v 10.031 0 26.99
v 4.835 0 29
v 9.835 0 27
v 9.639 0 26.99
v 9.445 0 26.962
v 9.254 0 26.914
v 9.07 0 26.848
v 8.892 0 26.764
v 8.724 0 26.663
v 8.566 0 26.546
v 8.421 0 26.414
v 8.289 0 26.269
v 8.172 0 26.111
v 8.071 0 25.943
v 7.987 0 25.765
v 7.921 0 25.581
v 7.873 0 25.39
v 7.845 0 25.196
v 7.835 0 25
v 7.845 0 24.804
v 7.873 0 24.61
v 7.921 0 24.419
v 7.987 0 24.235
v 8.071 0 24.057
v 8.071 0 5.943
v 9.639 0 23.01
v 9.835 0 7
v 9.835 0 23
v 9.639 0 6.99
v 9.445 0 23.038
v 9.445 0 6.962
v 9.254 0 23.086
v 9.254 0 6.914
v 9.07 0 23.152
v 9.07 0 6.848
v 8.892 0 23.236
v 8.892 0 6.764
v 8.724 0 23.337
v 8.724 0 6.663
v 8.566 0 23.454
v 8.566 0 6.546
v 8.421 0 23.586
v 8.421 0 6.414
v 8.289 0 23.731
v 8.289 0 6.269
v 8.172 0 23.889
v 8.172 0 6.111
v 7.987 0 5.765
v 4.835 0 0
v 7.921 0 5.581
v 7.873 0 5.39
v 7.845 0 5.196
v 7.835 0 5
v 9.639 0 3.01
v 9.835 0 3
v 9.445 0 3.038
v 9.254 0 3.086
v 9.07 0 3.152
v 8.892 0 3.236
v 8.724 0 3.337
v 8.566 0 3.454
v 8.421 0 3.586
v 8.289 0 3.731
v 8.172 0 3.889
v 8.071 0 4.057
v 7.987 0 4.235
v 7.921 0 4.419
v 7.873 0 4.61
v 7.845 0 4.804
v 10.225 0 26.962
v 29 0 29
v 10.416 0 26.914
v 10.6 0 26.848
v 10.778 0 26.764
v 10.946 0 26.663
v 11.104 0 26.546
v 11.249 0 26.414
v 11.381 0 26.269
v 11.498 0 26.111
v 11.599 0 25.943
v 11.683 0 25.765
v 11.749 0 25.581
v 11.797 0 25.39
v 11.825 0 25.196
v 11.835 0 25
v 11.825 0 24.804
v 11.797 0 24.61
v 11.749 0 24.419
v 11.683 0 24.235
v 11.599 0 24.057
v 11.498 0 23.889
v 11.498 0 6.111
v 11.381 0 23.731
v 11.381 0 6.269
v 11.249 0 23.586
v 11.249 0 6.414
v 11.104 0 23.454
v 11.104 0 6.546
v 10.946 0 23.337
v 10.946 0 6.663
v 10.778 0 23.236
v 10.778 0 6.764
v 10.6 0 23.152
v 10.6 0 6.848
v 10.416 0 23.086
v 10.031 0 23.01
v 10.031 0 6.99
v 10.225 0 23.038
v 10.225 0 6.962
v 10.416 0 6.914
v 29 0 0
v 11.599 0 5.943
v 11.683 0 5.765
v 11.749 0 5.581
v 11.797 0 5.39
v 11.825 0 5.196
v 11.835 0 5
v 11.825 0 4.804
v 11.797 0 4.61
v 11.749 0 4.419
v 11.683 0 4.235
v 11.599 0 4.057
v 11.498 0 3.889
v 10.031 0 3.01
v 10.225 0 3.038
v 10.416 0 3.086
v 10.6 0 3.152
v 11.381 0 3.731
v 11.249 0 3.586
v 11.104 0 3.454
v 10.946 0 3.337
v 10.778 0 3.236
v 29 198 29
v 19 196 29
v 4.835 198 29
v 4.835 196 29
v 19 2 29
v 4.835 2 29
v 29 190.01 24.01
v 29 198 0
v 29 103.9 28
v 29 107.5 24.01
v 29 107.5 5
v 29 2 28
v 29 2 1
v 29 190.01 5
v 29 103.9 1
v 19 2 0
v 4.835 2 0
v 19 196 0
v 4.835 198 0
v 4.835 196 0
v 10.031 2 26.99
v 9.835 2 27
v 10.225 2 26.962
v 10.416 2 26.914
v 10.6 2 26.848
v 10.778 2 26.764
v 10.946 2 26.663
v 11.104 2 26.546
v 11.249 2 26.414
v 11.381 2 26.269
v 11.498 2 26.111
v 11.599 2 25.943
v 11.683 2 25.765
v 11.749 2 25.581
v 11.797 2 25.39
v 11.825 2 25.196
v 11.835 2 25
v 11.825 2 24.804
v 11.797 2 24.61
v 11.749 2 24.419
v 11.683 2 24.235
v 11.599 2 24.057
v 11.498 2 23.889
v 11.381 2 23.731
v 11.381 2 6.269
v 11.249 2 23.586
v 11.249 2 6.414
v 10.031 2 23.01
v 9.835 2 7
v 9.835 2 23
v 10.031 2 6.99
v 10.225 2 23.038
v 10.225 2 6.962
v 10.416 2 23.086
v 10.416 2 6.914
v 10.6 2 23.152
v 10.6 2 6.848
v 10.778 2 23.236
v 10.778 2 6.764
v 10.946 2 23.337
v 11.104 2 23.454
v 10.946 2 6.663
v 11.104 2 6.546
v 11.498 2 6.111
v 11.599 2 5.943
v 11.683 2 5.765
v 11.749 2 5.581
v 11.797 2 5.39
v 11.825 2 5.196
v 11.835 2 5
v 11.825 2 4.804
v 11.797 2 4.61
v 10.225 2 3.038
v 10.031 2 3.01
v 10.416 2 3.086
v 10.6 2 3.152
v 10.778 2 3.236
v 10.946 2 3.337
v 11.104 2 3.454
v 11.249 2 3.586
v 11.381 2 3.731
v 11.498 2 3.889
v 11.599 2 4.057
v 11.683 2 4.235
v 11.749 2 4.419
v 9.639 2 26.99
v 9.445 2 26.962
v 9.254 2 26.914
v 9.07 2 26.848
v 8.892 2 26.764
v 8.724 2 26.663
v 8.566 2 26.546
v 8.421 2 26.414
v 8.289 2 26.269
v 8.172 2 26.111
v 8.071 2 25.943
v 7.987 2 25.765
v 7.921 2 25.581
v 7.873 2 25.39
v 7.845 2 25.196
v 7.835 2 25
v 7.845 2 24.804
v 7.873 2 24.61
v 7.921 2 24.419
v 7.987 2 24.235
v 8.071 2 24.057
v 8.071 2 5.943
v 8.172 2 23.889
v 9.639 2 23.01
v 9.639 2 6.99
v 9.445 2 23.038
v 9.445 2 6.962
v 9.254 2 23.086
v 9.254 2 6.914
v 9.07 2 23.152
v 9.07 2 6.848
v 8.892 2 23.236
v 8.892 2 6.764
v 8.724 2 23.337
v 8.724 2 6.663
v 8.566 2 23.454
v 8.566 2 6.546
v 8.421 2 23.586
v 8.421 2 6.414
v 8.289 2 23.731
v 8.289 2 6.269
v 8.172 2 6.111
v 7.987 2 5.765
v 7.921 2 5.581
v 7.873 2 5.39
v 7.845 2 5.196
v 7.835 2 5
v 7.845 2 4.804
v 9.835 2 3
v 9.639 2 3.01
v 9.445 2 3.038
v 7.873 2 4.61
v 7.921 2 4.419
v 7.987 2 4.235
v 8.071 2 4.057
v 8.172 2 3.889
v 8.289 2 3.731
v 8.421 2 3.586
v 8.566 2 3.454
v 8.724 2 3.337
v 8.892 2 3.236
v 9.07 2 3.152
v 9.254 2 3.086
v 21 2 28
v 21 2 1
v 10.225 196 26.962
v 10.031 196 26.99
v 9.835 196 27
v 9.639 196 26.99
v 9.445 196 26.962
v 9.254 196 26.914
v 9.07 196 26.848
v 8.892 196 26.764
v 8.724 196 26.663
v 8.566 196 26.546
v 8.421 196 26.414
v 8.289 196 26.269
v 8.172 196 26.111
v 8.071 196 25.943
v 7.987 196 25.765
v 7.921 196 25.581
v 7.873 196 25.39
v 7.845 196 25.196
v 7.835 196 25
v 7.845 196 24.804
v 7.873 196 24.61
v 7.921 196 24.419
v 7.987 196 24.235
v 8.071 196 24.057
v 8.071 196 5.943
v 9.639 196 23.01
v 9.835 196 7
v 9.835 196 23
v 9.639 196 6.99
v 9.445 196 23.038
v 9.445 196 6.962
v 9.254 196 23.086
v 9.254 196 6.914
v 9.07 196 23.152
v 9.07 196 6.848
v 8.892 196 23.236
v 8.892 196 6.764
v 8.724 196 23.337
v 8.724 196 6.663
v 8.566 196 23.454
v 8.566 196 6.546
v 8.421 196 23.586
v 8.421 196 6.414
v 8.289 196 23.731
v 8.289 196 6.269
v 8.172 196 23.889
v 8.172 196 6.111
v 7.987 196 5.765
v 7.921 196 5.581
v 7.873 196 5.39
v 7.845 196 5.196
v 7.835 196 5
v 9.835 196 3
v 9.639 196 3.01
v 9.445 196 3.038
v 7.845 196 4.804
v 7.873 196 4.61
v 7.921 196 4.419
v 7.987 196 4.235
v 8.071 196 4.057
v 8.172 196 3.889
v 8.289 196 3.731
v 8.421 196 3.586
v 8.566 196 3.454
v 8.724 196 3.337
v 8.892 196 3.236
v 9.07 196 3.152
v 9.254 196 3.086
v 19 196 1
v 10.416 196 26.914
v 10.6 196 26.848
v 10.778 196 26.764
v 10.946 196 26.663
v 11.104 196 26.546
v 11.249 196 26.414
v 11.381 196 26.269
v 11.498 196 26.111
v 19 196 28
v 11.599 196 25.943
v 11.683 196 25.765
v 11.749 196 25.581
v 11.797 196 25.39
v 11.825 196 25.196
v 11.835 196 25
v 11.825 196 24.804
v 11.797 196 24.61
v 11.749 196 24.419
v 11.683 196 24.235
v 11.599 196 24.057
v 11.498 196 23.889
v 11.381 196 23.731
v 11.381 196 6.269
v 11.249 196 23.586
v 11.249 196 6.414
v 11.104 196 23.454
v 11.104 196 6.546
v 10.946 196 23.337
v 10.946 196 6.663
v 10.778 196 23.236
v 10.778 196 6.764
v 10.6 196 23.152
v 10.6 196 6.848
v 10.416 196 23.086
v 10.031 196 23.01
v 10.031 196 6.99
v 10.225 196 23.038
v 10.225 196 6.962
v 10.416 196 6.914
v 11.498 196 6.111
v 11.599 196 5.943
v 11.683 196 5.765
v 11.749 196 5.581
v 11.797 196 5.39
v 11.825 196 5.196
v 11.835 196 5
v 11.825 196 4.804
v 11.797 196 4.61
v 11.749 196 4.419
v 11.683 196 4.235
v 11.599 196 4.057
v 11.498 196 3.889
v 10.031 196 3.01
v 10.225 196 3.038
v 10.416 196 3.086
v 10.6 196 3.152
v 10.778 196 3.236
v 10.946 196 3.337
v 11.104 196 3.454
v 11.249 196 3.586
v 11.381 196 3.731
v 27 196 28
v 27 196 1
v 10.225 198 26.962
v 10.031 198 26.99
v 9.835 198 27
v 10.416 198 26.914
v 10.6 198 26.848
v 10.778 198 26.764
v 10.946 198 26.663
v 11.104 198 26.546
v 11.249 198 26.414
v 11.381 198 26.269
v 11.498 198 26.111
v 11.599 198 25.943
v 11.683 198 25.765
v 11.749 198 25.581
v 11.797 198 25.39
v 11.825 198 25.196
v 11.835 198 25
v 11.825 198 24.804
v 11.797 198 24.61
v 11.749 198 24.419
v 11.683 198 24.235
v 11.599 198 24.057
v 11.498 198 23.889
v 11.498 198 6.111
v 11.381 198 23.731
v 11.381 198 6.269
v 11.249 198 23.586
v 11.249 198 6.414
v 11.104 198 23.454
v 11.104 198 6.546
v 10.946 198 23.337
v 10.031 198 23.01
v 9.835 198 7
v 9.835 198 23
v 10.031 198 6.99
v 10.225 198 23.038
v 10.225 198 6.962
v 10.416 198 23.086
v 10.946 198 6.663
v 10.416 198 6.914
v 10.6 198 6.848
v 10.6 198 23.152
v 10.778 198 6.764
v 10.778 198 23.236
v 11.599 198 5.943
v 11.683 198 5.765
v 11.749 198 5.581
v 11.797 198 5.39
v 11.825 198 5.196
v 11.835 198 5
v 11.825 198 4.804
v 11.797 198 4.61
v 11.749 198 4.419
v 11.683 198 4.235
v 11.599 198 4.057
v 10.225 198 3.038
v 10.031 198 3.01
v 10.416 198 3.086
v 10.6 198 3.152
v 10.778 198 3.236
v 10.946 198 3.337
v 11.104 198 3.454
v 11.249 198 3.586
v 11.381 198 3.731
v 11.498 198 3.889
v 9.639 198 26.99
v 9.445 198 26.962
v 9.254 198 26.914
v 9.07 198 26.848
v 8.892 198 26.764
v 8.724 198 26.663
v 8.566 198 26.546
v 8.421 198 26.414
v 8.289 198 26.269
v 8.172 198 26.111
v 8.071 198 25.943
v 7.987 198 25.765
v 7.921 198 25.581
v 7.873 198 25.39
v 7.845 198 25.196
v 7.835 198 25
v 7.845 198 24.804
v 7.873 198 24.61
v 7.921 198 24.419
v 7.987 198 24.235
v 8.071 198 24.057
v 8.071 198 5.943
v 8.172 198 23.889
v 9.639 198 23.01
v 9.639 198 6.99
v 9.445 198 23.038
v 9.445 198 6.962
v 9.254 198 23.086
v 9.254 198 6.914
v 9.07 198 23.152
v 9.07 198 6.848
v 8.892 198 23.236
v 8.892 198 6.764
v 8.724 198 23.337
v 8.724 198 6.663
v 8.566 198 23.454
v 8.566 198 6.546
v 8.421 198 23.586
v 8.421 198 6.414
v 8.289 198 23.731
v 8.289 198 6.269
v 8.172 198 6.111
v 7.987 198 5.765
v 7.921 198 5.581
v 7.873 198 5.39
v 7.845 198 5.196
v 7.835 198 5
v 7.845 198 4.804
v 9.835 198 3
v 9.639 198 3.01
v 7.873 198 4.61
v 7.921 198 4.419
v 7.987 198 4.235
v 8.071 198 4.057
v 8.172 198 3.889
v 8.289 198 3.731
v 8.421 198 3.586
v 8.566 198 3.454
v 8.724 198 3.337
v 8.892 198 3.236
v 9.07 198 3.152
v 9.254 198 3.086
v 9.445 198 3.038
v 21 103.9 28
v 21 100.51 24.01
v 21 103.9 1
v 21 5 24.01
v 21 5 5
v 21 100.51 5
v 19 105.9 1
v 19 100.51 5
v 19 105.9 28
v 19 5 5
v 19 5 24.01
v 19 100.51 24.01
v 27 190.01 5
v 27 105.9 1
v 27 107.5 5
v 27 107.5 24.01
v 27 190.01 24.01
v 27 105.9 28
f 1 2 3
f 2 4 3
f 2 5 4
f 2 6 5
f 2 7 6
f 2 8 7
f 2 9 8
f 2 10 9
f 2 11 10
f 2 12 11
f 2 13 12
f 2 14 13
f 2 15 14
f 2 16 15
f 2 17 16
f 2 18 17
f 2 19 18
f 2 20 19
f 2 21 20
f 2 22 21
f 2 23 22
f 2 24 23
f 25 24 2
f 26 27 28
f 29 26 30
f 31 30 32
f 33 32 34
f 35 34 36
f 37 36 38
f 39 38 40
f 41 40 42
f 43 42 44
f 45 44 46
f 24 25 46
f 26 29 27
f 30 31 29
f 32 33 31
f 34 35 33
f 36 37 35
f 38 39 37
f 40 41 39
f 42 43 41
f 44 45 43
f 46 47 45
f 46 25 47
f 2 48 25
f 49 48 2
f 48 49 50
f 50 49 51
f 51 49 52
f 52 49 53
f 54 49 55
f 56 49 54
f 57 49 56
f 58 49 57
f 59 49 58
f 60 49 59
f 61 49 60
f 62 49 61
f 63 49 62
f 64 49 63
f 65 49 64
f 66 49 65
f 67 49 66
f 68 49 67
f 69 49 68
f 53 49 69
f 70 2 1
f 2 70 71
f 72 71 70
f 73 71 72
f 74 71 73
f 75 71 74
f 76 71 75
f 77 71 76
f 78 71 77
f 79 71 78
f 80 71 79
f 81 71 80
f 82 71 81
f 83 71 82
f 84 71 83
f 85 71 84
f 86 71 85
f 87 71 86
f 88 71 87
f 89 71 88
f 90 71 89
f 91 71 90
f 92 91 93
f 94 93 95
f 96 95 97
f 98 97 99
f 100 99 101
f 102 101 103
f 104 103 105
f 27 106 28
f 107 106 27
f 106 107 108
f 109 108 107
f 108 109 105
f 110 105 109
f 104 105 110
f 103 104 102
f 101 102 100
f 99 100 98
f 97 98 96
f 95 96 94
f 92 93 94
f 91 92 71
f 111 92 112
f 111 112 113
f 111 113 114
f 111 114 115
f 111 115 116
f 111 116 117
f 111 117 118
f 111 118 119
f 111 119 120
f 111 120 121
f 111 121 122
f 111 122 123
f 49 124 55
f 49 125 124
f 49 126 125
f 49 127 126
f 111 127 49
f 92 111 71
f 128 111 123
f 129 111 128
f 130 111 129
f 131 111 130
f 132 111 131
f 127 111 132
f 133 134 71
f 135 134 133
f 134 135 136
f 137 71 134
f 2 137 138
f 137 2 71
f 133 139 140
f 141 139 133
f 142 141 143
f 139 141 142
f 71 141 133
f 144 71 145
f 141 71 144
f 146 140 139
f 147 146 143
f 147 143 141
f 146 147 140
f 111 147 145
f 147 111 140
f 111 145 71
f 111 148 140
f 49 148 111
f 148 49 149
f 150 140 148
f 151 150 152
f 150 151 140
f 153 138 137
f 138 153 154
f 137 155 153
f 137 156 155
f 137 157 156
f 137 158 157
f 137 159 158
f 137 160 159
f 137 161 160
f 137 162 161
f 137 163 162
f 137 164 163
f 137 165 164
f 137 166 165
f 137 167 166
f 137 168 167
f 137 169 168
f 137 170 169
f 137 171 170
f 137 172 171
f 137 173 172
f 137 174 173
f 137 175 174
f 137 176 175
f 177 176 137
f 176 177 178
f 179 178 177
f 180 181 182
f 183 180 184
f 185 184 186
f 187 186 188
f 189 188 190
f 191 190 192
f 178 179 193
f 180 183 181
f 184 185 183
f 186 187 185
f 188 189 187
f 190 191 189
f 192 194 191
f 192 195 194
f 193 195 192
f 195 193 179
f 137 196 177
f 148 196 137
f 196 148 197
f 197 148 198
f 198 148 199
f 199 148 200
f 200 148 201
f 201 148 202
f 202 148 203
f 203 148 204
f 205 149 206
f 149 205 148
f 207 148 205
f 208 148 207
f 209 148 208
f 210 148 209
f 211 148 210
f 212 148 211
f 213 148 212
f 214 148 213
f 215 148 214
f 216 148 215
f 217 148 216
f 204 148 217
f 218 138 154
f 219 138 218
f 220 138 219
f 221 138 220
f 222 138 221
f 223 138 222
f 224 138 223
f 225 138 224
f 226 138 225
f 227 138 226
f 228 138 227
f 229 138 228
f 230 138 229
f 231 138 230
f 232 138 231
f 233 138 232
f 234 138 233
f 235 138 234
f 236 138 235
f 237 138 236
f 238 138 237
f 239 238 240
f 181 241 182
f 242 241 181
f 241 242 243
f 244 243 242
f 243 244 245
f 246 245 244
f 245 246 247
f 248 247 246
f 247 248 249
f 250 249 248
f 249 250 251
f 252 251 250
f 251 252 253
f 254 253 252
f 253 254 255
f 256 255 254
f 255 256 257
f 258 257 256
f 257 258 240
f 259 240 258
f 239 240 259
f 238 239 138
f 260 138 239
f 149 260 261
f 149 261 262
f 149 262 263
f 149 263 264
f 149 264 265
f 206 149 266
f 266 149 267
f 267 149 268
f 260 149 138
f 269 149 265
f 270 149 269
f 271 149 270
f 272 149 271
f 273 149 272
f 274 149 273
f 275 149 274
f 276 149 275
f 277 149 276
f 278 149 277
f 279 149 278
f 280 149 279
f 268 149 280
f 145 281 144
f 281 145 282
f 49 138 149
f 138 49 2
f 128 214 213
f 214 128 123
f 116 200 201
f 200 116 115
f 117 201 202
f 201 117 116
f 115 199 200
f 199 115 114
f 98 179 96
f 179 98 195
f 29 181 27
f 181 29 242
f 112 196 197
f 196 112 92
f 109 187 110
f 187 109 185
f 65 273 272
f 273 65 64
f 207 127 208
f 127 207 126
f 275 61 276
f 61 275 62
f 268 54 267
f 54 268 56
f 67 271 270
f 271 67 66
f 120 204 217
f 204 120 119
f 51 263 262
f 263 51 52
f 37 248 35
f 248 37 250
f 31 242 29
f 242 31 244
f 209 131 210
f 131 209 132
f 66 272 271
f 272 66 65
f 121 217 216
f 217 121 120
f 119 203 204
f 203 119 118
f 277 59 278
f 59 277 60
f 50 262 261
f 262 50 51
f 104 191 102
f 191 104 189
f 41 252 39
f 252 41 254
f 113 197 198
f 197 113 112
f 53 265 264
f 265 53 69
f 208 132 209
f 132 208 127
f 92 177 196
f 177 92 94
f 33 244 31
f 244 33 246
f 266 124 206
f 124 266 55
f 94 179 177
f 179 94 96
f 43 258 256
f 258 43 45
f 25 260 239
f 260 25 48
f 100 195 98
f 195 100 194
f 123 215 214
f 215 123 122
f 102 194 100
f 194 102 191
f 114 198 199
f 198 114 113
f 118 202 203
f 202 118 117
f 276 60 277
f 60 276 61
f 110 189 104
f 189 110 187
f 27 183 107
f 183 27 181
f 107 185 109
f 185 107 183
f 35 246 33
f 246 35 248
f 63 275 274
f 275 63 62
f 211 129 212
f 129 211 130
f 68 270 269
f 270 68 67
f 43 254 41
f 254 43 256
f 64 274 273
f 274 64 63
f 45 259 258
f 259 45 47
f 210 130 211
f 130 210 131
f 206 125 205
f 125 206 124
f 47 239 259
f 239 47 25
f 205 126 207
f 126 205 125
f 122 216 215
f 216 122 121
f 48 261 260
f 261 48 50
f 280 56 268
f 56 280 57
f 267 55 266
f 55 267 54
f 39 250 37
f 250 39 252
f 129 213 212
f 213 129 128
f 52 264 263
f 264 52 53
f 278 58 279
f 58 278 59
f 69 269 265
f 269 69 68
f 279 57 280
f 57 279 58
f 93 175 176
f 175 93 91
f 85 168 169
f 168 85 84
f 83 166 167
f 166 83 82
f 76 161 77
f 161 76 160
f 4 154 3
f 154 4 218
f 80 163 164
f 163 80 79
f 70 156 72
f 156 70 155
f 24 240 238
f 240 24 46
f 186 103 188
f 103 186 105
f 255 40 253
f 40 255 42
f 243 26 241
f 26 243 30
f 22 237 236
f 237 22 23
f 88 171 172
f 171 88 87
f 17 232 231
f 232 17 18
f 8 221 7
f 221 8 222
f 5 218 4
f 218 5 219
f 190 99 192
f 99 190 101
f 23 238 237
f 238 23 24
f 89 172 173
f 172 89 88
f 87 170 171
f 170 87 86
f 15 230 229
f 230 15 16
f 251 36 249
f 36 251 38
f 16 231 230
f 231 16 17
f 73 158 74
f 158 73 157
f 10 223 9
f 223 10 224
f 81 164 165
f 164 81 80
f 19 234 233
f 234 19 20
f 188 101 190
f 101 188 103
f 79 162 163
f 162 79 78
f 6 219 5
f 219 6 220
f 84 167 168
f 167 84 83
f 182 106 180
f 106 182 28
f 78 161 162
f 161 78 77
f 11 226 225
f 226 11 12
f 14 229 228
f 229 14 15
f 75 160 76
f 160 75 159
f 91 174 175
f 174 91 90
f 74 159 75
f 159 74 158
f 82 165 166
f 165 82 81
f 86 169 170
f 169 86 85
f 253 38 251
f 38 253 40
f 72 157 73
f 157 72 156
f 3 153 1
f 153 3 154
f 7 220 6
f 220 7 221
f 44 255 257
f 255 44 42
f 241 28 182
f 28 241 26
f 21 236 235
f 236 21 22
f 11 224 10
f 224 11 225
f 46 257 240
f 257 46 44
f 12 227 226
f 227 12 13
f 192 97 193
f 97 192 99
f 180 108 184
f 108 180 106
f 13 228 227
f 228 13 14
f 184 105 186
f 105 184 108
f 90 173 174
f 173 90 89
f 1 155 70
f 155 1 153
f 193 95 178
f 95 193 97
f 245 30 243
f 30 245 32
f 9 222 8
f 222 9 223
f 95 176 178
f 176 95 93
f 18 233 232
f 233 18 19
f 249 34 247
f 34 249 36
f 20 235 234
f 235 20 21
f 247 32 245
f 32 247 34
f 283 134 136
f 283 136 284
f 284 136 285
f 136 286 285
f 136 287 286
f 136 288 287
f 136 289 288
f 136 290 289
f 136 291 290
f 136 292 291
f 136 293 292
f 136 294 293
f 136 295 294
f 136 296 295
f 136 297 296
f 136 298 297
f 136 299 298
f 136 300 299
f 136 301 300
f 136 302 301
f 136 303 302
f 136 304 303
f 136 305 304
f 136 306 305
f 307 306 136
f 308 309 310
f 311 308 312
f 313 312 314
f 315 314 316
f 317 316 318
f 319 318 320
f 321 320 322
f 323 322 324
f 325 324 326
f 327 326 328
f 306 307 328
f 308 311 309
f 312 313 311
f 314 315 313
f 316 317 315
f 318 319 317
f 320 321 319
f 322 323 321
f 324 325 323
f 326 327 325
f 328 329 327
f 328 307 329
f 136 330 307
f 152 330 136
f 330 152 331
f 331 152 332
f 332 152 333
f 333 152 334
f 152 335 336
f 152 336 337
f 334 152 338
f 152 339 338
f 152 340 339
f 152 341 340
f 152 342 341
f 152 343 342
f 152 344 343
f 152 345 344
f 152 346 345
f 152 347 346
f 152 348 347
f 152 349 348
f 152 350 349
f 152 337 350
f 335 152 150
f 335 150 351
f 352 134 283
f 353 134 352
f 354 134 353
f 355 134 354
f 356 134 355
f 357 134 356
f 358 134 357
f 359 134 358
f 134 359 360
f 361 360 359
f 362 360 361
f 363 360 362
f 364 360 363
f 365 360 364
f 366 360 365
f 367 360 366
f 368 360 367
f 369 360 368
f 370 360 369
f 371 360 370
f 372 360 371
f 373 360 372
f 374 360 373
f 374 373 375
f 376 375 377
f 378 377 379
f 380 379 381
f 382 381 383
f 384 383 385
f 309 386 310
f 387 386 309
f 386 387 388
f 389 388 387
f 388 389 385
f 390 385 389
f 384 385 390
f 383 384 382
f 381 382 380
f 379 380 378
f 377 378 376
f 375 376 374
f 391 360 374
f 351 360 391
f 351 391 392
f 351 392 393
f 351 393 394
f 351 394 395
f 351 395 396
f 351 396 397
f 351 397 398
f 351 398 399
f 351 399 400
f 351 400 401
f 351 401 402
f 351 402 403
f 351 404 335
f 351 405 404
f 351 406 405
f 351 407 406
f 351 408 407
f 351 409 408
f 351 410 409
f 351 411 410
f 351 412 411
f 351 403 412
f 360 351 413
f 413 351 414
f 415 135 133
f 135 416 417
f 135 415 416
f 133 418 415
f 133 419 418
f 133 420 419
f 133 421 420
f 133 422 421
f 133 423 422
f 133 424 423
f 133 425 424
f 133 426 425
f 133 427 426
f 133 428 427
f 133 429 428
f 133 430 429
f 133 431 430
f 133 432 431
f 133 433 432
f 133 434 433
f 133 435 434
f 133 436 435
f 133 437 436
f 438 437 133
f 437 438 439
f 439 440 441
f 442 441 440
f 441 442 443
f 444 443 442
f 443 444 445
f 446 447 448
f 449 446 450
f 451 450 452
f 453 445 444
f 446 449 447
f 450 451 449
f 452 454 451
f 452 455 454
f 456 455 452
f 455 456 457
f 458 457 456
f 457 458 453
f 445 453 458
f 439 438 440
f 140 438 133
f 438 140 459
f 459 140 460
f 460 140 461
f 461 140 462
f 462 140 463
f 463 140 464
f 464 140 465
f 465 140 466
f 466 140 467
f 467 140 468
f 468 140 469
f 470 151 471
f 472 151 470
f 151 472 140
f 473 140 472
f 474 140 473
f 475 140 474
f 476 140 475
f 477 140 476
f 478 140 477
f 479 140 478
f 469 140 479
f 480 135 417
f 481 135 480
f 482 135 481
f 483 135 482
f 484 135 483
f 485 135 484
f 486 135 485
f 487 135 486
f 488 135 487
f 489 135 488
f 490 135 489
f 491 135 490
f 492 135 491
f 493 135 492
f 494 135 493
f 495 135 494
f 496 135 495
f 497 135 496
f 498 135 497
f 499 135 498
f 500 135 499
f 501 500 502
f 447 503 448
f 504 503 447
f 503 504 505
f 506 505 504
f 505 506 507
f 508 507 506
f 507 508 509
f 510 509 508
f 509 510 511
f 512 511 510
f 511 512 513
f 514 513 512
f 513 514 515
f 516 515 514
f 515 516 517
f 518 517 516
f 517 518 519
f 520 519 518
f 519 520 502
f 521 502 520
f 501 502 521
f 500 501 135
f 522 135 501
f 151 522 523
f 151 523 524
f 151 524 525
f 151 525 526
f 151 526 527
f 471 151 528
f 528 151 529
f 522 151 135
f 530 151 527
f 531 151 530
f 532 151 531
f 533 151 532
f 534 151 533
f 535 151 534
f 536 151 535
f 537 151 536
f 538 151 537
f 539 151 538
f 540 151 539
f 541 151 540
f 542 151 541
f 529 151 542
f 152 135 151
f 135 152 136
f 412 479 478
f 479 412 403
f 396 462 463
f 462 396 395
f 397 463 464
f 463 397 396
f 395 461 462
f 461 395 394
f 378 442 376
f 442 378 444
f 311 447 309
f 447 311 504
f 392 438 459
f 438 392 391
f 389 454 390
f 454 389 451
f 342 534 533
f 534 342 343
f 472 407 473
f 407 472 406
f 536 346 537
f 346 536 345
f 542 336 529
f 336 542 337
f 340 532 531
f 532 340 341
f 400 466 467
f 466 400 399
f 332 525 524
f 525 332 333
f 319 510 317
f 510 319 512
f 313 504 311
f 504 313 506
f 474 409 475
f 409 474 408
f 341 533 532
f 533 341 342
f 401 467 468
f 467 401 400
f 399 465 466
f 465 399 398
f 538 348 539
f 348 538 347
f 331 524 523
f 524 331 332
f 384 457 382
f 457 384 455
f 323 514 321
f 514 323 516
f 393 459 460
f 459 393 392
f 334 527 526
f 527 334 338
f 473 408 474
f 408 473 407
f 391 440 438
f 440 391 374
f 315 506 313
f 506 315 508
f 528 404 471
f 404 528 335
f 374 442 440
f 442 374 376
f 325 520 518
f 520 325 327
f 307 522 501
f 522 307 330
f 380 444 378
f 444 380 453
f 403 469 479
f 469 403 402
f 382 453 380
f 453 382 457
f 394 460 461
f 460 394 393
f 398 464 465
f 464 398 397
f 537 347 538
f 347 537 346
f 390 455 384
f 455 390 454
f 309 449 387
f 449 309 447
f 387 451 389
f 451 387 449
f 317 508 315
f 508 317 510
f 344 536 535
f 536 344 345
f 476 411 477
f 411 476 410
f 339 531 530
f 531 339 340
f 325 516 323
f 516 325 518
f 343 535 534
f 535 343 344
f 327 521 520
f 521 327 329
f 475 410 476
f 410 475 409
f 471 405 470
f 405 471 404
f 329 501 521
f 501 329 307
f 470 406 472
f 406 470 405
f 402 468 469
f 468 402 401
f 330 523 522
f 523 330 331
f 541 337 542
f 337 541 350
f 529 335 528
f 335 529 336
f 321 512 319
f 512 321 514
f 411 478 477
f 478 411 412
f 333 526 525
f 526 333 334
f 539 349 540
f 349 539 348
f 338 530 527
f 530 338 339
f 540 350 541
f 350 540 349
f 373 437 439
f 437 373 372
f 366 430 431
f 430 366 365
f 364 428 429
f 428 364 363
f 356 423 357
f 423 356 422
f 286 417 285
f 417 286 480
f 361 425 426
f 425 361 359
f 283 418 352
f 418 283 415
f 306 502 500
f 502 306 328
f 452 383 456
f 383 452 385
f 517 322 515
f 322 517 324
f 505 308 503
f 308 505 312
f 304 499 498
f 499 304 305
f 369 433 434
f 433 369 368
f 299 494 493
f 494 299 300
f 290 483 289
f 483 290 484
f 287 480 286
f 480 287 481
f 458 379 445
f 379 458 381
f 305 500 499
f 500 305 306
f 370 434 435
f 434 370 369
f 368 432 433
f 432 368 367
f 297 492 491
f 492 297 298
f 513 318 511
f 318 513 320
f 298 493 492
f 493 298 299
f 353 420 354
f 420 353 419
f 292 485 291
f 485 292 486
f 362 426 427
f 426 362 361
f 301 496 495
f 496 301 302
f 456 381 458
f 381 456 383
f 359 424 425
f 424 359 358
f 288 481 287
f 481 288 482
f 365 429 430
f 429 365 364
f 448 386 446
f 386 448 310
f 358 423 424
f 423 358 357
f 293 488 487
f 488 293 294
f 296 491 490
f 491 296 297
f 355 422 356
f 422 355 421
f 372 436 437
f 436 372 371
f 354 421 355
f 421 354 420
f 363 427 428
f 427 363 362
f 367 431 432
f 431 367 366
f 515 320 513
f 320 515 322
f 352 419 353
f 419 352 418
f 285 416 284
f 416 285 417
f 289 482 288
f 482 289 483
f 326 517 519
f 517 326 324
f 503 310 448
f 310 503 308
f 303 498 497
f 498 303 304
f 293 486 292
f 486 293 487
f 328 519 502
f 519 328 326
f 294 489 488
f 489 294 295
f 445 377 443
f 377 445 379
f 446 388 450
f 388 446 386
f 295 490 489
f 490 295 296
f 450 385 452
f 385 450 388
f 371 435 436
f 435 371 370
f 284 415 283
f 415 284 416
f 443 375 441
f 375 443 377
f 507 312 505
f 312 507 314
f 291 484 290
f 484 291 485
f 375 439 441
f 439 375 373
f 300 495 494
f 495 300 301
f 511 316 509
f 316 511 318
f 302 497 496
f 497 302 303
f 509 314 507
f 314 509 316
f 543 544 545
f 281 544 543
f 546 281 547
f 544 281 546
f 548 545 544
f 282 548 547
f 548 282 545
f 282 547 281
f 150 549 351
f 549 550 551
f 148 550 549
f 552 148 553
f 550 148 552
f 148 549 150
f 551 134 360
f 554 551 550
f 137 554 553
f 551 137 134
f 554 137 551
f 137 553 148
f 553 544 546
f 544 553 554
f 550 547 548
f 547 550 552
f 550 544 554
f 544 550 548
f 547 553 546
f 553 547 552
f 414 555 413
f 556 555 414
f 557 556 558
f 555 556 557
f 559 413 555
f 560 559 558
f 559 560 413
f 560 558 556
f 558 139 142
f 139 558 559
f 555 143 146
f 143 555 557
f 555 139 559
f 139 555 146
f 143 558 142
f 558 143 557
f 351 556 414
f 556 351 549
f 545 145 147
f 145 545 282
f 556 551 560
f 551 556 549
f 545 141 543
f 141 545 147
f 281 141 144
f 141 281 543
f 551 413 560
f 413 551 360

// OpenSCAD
// file: screws.scad
/* Some common screw dimensions */
holeRadiusSlack = 0.5;


m3Diameter = 3.0;
m3Radius = m3Diameter/2.0;

m3RadiusSlacked = m3Radius + holeRadiusSlack;



m3ptr = m3RadiusSlacked;
// file: ../common.scad
/* Some initial configurations and commonly used variables
   plus functions
*/

$fn=64;


eps=0.01;
// main file
/* Simple configurable rack mount component to hold a box-like shell */

include <../common.scad>
include <./screws.scad>

slack = 0.4;

boxWidth = 157.67;
boxHeight = 27.0;
boxLength = 101.5;

topThickness = 1.0;
bottomThickness = 1.0;

sideThickness = 2.0;
sideSupportWidth = 10;

railWidth = 16.0;

totalHeight = boxHeight+topThickness+bottomThickness;
totalLength = boxLength+2*sideThickness;


railMountWidthDiff = (200.0 - (boxWidth + 2*sideThickness)) / 2.0;
  
module sideHolder() {


  module frontLowerCaseSegment() {
    translate(v=[0,0,0])
      cube(size=[sideSupportWidth, sideThickness, bottomThickness]);
  }

  module frontUpperCaseSegment() {
    // no room for slack? :(
    translate(v=[0,0,boxHeight+bottomThickness])
      cube(size=[sideSupportWidth, sideThickness, topThickness]);
  }

  module backLowerCaseSegment() {
      translate(v=[0,boxLength+slack+sideThickness,0])
        frontLowerCaseSegment();
  }

  module backUpperCaseSegment() {
      translate(v=[0,boxLength+slack+sideThickness,0])
        frontUpperCaseSegment();
  }

  module backLowerRailSegment() {
    translate(v=[0,198.0-sideThickness,0])
      cube(size=[sideSupportWidth, sideThickness, bottomThickness]);
  }

  
  module backUpperRailSegment() {
    translate(v=[0,198.0-sideThickness,boxHeight+bottomThickness])
      cube(size=[sideSupportWidth, sideThickness, topThickness]);
  }

  module frontRailMountSegment() {
    // +2 is slack
    translate(v=[-railMountWidthDiff+5,0,0])
      // should technically use different totalHeight, as current totalHeight is for case holder
      cube(size=[railWidth,sideThickness,totalHeight]);
  }

  module backRailMountSegment() {
    translate(v=[0,198.0-sideThickness,0])
      // should technically use different totalHeight, as current totalHeight is for case holder
      frontRailMountSegment();
  }


  module frontFace() {
    difference() {
      hull() {
        frontLowerCaseSegment();
        frontUpperCaseSegment();
        frontRailMountSegment();
      }

      // screw holes
      translate(v=[-railMountWidthDiff + 10,0,5])
        rotate(a=[90,0,0])
        cylinder(r=m3RadiusSlacked, h=10, center=true);

      translate(v=[-railMountWidthDiff + 10,0,25])
        rotate(a=[90,0,0])
        cylinder(r=m3RadiusSlacked, h=10, center=true);
    }
    
  }

  module backFace() {
    translate(v=[0,198.0-sideThickness,0])
      frontFace();
      
  }

  frontFace();
  backFace();

  

  hull() {
    frontLowerCaseSegment();
    backLowerCaseSegment();
  }

  hull() {
    backLowerCaseSegment();
    backUpperCaseSegment();
  }

  hull() {
    frontUpperCaseSegment();
    backUpperCaseSegment();
  }


  hull() {
    backLowerRailSegment();
    backLowerCaseSegment();
  }

  hull() {
    backUpperRailSegment();
    backUpperCaseSegment();
  }

  // side support/hold for case
  difference() {
    cube(size=[sideThickness, totalLength, totalHeight]);

    translate(v=[-eps/2,5,5])
      cube(size=[sideThickness+eps,totalLength-10+eps, totalHeight-10+eps]);
  }


  // side support/hold for case
  difference() {
    translate(v=[sideSupportWidth-sideThickness,totalLength,0])
    cube(size=[sideThickness, 198-totalLength, totalHeight]);

    translate(v=[sideSupportWidth-sideThickness-eps/2,(198-totalLength)+15,5])
      cube(size=[sideThickness+eps,(198-totalLength)-10+eps, totalHeight-10+eps]);
  }
}


module sideHolderAligned() {
  translate(v=[19,0,0])
    sideHolder();
}

module mSide() {
  mirror(v=[1,0,0]) {
    sideHolderAligned();
  }
}

sideHolderAligned();

translate(v=[42 + boxWidth,0,0])
*mSide();
